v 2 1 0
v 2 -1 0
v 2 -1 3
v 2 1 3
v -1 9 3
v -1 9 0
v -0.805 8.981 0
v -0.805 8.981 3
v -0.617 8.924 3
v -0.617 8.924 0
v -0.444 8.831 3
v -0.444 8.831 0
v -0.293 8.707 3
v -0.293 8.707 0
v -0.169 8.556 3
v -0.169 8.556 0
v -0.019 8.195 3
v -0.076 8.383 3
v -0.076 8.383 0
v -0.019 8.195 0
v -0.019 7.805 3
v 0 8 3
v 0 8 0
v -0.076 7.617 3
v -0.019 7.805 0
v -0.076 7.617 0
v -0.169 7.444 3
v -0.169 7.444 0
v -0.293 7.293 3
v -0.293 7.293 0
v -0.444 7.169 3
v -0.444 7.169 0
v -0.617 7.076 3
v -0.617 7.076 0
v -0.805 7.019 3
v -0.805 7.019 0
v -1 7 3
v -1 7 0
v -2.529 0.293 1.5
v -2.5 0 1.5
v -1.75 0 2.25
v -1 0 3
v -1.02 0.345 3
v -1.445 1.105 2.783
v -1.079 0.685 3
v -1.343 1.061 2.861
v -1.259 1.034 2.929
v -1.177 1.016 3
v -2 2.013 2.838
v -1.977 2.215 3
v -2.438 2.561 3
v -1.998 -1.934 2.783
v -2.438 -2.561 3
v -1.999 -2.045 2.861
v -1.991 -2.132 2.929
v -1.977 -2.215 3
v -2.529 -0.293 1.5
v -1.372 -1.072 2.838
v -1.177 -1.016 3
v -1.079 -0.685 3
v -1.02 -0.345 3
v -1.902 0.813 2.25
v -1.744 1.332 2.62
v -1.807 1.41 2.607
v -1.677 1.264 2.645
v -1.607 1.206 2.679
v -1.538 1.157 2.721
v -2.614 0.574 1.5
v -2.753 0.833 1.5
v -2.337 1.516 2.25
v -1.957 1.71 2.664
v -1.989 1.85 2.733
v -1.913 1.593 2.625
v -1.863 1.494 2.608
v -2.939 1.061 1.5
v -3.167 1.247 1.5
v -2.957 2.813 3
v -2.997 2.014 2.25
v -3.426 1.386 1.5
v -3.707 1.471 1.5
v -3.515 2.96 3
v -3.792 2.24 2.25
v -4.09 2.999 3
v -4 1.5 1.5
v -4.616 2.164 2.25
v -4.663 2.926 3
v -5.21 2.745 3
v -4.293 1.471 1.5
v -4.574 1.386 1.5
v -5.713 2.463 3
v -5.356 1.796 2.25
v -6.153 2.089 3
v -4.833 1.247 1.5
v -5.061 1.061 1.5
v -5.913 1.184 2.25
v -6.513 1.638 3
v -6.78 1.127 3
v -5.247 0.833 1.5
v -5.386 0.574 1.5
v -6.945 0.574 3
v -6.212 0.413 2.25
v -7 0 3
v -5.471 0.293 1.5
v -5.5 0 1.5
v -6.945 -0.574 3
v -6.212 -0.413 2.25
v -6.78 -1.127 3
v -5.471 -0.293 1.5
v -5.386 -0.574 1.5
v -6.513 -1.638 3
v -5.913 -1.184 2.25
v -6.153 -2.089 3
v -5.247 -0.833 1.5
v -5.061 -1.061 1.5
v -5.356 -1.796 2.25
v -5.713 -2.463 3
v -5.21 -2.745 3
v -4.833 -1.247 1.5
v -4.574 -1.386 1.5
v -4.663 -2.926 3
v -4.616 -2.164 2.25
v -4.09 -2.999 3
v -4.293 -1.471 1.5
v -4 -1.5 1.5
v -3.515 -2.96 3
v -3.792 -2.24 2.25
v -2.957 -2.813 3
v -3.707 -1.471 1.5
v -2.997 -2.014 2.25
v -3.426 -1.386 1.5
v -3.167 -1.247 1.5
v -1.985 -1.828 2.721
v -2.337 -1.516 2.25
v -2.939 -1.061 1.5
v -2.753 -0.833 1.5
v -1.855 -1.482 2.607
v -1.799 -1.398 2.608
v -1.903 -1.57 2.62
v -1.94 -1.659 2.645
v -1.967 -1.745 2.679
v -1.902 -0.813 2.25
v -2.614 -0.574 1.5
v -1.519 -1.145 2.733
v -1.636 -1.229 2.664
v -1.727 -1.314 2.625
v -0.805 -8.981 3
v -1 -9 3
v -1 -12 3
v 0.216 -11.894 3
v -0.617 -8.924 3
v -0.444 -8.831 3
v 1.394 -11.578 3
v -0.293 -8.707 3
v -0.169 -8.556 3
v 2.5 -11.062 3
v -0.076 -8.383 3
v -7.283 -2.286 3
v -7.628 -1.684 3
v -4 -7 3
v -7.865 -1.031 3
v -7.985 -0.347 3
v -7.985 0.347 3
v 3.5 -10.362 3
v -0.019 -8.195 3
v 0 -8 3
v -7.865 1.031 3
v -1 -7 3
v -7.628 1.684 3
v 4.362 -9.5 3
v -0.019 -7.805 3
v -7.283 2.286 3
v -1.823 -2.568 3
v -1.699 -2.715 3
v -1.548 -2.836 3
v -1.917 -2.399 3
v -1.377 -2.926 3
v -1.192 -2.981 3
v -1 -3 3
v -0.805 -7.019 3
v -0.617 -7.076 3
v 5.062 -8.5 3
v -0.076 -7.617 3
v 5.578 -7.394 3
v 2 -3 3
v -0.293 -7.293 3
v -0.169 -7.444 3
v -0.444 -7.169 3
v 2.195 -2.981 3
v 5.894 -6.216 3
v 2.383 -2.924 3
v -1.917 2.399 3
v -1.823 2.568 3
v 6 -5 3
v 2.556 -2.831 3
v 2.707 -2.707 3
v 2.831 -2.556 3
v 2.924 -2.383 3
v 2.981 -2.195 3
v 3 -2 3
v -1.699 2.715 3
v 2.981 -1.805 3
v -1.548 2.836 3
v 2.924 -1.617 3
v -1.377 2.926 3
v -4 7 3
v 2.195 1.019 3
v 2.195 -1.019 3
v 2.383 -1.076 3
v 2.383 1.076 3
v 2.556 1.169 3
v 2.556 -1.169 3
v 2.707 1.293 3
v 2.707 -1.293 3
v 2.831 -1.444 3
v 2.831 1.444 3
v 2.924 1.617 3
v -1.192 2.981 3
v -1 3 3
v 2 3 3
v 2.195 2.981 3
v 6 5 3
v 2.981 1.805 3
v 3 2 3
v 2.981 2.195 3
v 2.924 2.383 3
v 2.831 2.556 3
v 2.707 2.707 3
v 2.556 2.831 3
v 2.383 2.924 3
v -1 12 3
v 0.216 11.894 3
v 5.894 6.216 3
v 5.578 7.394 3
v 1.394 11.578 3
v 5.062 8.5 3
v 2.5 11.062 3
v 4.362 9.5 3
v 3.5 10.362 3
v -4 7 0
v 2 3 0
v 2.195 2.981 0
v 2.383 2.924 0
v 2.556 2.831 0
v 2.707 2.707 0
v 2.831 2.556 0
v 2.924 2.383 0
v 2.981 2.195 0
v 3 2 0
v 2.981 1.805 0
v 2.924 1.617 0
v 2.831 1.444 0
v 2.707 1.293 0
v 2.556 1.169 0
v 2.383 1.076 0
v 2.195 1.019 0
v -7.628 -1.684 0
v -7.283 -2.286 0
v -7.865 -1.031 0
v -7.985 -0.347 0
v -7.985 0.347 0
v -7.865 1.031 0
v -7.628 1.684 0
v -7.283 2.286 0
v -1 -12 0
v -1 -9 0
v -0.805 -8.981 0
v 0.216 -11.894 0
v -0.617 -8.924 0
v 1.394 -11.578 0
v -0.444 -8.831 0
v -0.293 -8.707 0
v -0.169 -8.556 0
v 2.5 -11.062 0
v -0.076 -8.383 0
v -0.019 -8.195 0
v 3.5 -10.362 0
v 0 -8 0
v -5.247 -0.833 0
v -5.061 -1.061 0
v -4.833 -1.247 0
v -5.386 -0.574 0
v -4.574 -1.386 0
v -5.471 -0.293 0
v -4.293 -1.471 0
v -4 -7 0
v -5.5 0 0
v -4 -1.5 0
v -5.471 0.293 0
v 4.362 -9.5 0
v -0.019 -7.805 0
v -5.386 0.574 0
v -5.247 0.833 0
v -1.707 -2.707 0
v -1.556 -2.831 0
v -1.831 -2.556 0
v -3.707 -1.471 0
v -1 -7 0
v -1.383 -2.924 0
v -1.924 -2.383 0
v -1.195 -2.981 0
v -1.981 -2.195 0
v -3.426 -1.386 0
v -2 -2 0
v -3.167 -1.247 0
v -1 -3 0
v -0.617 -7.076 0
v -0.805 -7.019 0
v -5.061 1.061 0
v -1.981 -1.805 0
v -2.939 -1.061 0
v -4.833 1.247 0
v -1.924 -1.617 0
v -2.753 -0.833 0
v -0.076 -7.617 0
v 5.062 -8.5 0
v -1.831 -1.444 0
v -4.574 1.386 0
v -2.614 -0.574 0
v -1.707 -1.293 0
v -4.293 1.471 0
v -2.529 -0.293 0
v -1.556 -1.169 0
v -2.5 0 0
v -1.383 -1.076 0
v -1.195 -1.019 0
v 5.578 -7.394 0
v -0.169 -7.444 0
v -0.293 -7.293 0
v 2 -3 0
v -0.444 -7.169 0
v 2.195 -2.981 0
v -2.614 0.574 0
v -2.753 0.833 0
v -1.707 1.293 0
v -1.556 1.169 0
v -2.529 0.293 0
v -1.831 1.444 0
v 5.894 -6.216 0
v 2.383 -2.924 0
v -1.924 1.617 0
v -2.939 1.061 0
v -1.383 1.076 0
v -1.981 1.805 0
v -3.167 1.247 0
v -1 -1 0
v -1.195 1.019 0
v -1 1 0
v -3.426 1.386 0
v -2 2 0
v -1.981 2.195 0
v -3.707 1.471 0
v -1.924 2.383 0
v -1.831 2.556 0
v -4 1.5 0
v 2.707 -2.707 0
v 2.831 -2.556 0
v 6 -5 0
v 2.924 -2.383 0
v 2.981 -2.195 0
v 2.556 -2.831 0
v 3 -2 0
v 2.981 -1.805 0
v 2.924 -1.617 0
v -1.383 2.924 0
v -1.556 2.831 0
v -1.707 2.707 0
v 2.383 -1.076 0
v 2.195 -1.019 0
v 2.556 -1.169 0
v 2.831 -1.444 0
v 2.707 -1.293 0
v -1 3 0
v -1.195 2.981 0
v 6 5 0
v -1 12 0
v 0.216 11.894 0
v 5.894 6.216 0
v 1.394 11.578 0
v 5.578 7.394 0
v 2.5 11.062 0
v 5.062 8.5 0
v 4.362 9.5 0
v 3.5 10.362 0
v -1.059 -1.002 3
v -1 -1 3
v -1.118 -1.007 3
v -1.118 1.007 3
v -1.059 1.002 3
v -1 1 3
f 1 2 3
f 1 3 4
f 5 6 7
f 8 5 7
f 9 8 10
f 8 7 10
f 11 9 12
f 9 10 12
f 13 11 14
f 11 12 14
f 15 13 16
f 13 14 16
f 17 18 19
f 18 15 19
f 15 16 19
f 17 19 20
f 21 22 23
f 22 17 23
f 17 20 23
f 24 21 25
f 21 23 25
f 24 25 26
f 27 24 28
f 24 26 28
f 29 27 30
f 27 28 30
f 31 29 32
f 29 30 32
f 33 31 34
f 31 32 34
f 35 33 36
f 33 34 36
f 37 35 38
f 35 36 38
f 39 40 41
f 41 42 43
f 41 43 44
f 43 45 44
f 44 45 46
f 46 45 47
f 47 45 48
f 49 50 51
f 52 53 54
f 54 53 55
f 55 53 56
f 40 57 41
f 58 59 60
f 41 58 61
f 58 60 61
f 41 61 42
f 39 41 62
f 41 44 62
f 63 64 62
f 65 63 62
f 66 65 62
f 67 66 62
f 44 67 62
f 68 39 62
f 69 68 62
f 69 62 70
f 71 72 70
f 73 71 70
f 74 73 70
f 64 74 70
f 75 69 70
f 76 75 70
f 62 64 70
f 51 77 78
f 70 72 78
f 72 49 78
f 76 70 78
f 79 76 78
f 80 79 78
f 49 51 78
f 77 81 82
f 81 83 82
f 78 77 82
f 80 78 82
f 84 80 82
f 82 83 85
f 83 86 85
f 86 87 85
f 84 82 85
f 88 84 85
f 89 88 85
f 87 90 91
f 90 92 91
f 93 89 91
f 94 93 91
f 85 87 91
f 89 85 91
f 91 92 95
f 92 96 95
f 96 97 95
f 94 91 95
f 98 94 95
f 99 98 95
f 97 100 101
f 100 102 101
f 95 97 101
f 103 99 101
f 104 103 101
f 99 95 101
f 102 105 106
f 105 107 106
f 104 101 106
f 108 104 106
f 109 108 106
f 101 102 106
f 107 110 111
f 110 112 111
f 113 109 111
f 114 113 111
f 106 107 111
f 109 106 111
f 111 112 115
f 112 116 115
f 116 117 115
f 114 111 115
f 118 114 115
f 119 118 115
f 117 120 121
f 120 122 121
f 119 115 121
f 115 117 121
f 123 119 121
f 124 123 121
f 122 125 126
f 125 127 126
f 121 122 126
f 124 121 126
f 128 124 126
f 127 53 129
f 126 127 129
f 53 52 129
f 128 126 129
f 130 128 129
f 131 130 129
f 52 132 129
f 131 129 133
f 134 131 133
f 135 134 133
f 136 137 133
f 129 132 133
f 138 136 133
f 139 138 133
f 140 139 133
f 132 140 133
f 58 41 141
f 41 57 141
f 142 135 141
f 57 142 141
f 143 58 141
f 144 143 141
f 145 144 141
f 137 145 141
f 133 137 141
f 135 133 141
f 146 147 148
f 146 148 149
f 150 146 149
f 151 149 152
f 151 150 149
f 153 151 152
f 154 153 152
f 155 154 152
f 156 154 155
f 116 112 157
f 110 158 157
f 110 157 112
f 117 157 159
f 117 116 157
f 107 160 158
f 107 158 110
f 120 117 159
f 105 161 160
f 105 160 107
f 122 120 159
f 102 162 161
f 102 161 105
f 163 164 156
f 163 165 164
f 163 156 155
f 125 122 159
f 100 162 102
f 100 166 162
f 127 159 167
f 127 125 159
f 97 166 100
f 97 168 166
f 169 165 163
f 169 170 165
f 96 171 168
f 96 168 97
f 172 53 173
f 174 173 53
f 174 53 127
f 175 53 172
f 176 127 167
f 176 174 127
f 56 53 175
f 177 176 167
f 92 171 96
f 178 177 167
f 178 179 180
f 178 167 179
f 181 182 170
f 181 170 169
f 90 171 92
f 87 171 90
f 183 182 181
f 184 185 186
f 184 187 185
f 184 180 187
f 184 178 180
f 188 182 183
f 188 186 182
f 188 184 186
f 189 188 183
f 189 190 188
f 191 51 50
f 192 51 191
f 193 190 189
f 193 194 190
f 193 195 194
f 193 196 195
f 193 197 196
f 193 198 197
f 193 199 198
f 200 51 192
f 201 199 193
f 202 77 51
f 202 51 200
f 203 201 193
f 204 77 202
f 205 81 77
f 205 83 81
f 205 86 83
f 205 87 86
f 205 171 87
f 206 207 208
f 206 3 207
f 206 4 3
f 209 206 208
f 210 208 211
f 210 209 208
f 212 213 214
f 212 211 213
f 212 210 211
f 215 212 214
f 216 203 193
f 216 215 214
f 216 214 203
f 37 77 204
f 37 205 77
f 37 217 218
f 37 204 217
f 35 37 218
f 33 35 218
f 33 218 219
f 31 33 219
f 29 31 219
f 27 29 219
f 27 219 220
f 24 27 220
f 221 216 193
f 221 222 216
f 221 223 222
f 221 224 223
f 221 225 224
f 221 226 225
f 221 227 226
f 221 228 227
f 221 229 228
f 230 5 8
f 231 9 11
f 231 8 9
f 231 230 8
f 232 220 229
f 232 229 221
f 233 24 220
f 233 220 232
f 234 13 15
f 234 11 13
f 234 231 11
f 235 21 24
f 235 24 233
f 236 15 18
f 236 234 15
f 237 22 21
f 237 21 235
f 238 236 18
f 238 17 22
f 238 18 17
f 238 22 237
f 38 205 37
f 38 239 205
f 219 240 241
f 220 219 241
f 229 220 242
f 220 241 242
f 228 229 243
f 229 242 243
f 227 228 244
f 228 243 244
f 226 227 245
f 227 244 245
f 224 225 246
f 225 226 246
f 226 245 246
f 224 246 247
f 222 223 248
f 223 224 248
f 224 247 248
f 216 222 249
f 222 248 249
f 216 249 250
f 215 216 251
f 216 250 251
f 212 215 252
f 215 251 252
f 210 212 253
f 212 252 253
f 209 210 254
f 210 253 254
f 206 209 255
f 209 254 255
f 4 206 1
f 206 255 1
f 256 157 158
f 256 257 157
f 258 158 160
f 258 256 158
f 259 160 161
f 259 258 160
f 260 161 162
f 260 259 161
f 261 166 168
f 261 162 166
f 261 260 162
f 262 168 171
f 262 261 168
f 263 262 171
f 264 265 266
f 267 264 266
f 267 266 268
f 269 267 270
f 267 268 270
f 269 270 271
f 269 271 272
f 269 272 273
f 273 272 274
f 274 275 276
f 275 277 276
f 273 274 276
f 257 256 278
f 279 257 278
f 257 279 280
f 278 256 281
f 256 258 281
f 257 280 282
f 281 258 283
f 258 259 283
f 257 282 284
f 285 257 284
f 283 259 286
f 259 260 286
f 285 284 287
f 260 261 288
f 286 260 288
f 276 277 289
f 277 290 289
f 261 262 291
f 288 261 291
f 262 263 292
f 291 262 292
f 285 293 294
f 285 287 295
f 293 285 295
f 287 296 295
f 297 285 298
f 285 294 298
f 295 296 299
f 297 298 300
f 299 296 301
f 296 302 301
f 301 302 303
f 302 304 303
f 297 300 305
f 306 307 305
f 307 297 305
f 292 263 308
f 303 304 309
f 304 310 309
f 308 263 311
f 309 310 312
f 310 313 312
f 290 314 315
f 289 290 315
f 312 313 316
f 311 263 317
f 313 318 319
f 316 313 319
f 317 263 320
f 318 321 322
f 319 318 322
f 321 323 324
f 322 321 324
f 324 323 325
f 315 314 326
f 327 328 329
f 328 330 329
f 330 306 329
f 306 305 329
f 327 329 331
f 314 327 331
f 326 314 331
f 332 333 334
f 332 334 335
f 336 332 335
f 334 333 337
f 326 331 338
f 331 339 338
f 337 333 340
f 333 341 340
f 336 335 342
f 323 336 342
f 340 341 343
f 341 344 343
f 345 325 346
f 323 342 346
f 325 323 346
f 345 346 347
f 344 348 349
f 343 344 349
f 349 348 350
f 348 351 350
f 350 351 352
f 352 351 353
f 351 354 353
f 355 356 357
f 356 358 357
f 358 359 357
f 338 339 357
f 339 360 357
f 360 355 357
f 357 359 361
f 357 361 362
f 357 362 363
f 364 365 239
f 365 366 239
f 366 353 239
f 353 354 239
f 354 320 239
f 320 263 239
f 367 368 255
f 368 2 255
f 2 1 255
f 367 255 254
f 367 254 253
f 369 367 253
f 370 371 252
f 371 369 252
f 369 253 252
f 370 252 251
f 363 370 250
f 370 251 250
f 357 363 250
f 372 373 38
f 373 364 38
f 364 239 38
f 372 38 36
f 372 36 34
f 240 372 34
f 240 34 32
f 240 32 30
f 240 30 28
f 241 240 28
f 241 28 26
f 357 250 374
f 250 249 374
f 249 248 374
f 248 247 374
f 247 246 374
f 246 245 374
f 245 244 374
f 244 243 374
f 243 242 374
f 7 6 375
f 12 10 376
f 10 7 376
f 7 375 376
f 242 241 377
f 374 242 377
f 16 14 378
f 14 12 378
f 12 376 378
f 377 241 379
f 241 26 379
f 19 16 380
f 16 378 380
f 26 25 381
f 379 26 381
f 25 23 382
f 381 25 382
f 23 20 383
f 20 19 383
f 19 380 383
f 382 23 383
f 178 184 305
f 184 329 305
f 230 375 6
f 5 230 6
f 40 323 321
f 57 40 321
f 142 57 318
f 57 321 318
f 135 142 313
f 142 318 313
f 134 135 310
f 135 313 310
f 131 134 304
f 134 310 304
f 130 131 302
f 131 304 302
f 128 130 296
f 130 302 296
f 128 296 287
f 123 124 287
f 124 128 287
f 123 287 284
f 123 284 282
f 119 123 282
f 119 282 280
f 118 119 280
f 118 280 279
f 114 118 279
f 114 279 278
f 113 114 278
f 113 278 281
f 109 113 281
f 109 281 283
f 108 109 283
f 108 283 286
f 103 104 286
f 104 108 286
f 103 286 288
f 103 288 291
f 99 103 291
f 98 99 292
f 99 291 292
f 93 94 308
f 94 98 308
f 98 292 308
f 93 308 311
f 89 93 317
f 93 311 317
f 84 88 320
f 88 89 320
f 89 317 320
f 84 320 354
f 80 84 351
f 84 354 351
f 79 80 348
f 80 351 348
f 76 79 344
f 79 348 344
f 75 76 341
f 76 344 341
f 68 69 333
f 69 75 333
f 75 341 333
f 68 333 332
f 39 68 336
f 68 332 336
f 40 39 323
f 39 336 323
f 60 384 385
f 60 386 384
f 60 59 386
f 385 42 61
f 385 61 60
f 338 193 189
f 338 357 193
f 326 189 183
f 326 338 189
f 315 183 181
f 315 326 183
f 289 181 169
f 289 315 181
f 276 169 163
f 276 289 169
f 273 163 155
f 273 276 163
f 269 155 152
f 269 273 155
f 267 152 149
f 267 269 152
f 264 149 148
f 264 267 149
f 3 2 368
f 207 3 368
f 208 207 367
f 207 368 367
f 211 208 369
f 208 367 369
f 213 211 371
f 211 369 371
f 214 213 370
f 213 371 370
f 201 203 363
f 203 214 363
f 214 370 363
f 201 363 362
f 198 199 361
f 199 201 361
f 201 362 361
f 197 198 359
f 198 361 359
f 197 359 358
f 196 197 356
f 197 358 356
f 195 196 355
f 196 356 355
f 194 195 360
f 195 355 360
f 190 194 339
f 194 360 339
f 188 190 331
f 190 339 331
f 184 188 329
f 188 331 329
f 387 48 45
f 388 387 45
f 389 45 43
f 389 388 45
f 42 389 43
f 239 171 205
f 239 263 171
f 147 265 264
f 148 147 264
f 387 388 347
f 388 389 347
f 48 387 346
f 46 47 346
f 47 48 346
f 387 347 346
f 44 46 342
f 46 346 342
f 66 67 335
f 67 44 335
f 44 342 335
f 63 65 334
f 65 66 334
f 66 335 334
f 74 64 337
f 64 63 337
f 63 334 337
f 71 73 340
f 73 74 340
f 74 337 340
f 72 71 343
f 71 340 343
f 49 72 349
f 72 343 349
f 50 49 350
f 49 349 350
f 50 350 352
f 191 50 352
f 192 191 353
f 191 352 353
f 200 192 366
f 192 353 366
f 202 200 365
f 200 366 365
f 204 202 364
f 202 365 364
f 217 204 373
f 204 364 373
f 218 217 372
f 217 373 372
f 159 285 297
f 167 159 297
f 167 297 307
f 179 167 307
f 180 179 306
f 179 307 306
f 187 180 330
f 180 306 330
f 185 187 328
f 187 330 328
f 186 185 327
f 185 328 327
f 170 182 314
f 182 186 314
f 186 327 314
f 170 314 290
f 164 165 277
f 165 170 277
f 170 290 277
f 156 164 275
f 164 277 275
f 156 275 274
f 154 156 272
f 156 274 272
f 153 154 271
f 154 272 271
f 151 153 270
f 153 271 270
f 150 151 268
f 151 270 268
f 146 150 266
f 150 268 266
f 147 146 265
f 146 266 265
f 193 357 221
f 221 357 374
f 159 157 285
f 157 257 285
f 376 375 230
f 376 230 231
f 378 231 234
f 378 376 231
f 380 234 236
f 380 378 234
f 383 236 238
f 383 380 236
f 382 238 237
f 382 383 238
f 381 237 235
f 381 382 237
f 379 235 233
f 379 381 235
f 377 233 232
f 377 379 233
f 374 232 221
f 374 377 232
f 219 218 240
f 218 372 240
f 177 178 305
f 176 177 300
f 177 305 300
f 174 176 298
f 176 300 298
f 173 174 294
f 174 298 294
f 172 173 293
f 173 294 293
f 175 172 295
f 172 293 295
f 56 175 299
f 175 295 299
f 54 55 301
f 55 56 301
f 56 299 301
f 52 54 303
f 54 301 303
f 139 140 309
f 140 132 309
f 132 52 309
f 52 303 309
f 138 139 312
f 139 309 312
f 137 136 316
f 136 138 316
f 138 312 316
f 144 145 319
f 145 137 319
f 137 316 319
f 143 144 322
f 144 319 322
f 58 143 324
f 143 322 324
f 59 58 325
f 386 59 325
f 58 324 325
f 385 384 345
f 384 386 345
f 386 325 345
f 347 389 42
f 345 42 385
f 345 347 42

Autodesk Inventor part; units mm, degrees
ref_plane "YZ Plane" through (0, 0, 0) normal (1, 0, 0) x (0, 1, 0)
ref_plane "XZ Plane" through (0, 0, 0) normal (0, 1, 0) x (-1, 0, 0)
ref_plane "XY Plane" through (0, 0, 0) normal (0, 0, 1) x (1, 0, 0)
sketch "スケッチ5" plane through (0, 0, 0) normal (0, 0, 1) x (1, 0, 0)
  line L0 (-1, 1) -> (-1, -1)
  circle A0 centre (-4, 0) radius 1.5
  arc A1 (2, 1) -> (2, 3) centre (2, 2) ccw
  arc A2 (2, -3) -> (2, -1) centre (2, -2) ccw
  arc A3 (-1, 3) -> (-1, 1) centre (-1, 2) ccw
  arc A4 (-1, -1) -> (-1, -3) centre (-1, -2) ccw
  line L1 (2, -3) -> (-1, -3)
  line L2 (-1, 3) -> (2, 3)
  arc A5 (-7.2826, 2.2857) -> (-7.2826, -2.2857) centre (-4, 0) ccw
  line L3 (-1, -7) -> (-1, -7)
  line L4 (6, -5) -> (6, 5)
  line L5 (-1, 7) -> (-1, 7)
  line L6 (0, 0) -> (-1, 0) construction
  arc A6 (-1, -9) -> (-1, -7) centre (-1, -8) ccw
  line L7 (-1, -9) -> (-1, -12)
  arc A7 (-1, -12) -> (6, -5) centre (-1, -5) ccw
  arc A8 (6, 5) -> (-1, 12) centre (-1, 5) ccw
  line L8 (-1, 12) -> (-1, 9)
  arc A9 (-1, 7) -> (-1, 9) centre (-1, 8) ccw
  line L9 (2, -1) -> (2, 1)
  line L10 (-7.2826, -2.2857) -> (-4, -7)
  line L11 (-4, -7) -> (-1, -7)
  line L12 (-7.2826, 2.2857) -> (-4, 7)
  line L13 (-4, 7) -> (-1, 7)
  point P0 (2, 0)
  point P1 (6, 0)
  point P2 (2, 0)
  dimension "d57" = 3
  dimension "d58" = 2
  dimension "d60" = 4
  dimension "d61" = 4
  dimension "d62" = 3
  dimension "d63" = 14
  dimension "d65" = 4
  dimension "d66" = 3
  dimension "d67" = 2
  dimension "d68" = 3
  dimension "d69" = 6
  dimension "d72" = 3
extrude "押し出し2" add sketch "スケッチ5" along normal blind 3
chamfer "面取り2" distance 1.5 angle 45 1 edges at (-5.5, 0, 3)
properties part number "ShaftBase2"
